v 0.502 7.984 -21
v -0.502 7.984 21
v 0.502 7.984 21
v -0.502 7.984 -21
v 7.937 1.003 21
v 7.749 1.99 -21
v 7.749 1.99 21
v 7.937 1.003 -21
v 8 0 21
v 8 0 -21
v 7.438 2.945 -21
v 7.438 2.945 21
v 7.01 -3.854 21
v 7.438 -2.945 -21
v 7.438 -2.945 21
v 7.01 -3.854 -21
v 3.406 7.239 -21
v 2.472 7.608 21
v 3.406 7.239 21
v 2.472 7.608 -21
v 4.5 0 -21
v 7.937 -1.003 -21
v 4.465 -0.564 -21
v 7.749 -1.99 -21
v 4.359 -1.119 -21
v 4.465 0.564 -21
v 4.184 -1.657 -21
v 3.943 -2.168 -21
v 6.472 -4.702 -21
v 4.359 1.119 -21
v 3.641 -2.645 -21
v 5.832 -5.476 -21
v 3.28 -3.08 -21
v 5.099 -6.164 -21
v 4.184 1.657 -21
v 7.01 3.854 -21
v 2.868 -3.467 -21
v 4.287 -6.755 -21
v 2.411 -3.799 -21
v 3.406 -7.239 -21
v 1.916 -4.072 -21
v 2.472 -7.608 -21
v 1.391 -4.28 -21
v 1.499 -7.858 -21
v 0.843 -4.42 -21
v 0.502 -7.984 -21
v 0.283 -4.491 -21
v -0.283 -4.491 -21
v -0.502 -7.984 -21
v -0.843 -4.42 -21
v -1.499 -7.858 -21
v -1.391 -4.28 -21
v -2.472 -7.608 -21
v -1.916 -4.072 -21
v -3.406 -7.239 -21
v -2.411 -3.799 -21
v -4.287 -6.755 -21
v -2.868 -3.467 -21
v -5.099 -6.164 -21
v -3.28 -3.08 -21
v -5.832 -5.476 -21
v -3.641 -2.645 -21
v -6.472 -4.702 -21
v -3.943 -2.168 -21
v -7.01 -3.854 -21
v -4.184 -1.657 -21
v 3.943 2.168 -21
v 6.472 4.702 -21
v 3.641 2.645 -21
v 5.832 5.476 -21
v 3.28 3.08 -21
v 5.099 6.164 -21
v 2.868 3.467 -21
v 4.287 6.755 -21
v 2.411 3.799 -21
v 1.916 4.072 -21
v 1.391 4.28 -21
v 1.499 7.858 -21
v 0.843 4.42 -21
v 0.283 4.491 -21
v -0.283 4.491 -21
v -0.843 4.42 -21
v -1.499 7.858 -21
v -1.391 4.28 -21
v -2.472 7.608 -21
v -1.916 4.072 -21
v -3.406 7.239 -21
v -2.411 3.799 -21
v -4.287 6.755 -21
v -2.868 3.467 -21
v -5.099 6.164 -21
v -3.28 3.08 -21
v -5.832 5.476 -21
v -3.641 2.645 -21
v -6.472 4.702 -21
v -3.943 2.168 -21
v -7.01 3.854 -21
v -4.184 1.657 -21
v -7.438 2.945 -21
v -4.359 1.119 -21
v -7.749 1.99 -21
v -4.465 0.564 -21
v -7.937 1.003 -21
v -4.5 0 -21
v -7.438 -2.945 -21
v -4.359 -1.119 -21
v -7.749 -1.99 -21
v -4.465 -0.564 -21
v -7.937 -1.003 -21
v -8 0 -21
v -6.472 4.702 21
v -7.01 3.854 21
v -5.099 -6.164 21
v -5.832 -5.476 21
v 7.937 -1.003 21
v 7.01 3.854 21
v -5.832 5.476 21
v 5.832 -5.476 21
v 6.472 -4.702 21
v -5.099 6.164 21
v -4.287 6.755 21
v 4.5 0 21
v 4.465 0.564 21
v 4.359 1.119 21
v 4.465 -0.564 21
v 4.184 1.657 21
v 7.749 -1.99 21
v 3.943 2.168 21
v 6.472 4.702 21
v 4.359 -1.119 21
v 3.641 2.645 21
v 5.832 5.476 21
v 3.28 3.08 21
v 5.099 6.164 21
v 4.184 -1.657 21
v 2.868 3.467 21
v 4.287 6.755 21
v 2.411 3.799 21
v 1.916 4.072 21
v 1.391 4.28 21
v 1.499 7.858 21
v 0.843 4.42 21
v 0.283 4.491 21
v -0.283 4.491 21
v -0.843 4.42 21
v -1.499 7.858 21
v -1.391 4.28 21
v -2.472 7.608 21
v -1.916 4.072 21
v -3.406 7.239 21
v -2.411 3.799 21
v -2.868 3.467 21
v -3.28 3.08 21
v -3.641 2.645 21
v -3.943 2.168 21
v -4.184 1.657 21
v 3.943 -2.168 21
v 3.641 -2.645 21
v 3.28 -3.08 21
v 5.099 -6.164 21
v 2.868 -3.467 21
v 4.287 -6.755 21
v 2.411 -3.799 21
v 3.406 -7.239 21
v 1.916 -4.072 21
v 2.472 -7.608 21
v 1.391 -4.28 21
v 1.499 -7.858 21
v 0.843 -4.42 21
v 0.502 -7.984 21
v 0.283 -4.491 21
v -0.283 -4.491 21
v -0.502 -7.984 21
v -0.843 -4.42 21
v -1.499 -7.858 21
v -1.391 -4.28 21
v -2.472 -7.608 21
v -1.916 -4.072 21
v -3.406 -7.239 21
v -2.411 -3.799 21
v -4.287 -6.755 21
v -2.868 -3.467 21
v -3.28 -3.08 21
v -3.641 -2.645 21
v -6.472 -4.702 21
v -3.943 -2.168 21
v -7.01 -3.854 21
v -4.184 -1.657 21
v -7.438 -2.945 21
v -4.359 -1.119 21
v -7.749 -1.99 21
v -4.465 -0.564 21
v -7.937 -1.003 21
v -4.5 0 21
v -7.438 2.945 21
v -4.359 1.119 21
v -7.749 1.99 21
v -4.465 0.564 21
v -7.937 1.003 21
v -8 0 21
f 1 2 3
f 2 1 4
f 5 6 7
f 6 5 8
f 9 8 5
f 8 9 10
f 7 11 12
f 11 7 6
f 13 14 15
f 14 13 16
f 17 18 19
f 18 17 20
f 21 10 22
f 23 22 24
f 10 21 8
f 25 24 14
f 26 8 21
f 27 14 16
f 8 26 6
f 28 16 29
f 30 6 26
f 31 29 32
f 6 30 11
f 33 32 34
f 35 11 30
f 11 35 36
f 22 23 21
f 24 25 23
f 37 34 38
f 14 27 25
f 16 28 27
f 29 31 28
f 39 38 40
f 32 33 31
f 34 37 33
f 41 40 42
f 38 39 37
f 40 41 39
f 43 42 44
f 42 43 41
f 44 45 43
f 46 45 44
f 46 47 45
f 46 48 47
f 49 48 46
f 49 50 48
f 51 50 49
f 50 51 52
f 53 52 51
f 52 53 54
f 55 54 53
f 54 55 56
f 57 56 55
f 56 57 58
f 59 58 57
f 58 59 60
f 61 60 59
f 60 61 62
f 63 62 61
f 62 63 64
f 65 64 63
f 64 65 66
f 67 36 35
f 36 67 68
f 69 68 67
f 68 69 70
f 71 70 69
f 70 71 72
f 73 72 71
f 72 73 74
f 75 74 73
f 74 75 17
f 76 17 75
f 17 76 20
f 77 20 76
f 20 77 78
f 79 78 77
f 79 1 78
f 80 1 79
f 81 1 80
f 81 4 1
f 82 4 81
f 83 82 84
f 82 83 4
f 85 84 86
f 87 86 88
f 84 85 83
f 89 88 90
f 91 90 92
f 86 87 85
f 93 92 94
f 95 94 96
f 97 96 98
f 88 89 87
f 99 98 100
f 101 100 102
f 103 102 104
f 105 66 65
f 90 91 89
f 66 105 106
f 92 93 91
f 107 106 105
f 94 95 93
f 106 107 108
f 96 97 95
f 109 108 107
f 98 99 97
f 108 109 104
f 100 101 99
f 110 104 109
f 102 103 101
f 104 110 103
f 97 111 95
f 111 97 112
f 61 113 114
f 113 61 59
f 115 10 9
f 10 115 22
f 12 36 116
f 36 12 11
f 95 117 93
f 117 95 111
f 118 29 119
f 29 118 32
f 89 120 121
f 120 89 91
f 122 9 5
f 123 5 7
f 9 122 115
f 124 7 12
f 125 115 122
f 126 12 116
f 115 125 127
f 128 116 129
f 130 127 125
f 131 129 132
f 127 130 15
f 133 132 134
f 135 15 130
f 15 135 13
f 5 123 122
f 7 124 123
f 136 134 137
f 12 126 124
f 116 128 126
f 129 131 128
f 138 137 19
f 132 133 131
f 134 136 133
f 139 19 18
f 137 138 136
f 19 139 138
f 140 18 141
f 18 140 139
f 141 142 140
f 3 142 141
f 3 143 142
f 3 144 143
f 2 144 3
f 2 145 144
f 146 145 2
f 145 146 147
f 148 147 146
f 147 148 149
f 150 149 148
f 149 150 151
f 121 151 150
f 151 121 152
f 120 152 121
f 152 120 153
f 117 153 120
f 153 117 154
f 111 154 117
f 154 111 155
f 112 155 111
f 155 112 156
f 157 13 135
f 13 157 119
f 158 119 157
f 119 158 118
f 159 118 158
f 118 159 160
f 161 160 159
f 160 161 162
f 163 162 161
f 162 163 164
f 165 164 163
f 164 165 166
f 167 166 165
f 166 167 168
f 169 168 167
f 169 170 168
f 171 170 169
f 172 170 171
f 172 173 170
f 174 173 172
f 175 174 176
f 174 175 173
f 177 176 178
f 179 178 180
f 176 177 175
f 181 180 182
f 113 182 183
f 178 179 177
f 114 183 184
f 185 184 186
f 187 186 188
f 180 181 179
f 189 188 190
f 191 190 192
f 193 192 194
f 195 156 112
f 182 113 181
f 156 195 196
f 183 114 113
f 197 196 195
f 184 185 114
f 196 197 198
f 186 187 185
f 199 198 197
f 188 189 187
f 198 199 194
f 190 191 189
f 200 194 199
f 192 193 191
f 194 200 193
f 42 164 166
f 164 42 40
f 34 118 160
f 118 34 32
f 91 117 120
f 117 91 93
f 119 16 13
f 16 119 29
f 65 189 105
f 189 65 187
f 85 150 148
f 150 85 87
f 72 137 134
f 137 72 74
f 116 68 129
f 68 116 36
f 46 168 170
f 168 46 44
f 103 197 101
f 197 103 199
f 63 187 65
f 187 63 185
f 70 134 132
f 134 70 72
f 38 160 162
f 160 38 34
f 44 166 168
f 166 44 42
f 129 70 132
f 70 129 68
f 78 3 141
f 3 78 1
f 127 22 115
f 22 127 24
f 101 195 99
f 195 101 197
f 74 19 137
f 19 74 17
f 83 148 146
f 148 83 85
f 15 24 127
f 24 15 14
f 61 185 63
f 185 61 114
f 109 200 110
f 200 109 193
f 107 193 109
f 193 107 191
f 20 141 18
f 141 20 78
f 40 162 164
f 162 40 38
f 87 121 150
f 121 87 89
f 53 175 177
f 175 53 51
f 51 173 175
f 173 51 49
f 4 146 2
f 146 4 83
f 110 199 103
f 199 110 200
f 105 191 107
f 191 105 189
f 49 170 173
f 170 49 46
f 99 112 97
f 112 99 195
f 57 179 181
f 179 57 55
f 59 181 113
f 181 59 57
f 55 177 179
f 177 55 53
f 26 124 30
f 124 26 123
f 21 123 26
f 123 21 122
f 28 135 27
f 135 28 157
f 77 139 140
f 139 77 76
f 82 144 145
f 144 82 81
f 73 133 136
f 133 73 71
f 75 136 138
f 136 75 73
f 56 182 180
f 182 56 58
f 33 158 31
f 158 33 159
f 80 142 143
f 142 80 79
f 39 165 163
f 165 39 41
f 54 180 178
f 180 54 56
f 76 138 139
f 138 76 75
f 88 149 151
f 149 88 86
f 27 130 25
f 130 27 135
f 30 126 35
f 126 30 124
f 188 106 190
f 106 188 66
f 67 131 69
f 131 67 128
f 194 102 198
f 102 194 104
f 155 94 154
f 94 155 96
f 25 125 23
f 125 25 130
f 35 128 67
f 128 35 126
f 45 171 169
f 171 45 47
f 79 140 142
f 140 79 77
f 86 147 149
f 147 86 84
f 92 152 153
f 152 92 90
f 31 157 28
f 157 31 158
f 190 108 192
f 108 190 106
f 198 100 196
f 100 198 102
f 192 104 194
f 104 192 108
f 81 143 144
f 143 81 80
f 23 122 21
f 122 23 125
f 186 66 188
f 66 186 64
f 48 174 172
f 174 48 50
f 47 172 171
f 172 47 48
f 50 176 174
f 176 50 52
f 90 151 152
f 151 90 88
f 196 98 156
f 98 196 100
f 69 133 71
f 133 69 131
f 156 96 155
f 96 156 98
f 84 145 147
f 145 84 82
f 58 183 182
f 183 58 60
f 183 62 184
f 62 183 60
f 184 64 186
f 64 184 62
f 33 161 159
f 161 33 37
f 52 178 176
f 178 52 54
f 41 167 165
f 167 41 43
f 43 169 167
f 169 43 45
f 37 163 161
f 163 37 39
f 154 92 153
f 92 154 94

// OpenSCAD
$fn = 50;


difference() {
	union() {
		translate(v = [0, 0, -21.0000000000]) {
			cylinder(h = 42, r = 8.0000000000);
		}
	}
	union() {
		translate(v = [0, 0, -100.0000000000]) {
			cylinder(h = 200, r = 4.5000000000);
		}
	}
}
